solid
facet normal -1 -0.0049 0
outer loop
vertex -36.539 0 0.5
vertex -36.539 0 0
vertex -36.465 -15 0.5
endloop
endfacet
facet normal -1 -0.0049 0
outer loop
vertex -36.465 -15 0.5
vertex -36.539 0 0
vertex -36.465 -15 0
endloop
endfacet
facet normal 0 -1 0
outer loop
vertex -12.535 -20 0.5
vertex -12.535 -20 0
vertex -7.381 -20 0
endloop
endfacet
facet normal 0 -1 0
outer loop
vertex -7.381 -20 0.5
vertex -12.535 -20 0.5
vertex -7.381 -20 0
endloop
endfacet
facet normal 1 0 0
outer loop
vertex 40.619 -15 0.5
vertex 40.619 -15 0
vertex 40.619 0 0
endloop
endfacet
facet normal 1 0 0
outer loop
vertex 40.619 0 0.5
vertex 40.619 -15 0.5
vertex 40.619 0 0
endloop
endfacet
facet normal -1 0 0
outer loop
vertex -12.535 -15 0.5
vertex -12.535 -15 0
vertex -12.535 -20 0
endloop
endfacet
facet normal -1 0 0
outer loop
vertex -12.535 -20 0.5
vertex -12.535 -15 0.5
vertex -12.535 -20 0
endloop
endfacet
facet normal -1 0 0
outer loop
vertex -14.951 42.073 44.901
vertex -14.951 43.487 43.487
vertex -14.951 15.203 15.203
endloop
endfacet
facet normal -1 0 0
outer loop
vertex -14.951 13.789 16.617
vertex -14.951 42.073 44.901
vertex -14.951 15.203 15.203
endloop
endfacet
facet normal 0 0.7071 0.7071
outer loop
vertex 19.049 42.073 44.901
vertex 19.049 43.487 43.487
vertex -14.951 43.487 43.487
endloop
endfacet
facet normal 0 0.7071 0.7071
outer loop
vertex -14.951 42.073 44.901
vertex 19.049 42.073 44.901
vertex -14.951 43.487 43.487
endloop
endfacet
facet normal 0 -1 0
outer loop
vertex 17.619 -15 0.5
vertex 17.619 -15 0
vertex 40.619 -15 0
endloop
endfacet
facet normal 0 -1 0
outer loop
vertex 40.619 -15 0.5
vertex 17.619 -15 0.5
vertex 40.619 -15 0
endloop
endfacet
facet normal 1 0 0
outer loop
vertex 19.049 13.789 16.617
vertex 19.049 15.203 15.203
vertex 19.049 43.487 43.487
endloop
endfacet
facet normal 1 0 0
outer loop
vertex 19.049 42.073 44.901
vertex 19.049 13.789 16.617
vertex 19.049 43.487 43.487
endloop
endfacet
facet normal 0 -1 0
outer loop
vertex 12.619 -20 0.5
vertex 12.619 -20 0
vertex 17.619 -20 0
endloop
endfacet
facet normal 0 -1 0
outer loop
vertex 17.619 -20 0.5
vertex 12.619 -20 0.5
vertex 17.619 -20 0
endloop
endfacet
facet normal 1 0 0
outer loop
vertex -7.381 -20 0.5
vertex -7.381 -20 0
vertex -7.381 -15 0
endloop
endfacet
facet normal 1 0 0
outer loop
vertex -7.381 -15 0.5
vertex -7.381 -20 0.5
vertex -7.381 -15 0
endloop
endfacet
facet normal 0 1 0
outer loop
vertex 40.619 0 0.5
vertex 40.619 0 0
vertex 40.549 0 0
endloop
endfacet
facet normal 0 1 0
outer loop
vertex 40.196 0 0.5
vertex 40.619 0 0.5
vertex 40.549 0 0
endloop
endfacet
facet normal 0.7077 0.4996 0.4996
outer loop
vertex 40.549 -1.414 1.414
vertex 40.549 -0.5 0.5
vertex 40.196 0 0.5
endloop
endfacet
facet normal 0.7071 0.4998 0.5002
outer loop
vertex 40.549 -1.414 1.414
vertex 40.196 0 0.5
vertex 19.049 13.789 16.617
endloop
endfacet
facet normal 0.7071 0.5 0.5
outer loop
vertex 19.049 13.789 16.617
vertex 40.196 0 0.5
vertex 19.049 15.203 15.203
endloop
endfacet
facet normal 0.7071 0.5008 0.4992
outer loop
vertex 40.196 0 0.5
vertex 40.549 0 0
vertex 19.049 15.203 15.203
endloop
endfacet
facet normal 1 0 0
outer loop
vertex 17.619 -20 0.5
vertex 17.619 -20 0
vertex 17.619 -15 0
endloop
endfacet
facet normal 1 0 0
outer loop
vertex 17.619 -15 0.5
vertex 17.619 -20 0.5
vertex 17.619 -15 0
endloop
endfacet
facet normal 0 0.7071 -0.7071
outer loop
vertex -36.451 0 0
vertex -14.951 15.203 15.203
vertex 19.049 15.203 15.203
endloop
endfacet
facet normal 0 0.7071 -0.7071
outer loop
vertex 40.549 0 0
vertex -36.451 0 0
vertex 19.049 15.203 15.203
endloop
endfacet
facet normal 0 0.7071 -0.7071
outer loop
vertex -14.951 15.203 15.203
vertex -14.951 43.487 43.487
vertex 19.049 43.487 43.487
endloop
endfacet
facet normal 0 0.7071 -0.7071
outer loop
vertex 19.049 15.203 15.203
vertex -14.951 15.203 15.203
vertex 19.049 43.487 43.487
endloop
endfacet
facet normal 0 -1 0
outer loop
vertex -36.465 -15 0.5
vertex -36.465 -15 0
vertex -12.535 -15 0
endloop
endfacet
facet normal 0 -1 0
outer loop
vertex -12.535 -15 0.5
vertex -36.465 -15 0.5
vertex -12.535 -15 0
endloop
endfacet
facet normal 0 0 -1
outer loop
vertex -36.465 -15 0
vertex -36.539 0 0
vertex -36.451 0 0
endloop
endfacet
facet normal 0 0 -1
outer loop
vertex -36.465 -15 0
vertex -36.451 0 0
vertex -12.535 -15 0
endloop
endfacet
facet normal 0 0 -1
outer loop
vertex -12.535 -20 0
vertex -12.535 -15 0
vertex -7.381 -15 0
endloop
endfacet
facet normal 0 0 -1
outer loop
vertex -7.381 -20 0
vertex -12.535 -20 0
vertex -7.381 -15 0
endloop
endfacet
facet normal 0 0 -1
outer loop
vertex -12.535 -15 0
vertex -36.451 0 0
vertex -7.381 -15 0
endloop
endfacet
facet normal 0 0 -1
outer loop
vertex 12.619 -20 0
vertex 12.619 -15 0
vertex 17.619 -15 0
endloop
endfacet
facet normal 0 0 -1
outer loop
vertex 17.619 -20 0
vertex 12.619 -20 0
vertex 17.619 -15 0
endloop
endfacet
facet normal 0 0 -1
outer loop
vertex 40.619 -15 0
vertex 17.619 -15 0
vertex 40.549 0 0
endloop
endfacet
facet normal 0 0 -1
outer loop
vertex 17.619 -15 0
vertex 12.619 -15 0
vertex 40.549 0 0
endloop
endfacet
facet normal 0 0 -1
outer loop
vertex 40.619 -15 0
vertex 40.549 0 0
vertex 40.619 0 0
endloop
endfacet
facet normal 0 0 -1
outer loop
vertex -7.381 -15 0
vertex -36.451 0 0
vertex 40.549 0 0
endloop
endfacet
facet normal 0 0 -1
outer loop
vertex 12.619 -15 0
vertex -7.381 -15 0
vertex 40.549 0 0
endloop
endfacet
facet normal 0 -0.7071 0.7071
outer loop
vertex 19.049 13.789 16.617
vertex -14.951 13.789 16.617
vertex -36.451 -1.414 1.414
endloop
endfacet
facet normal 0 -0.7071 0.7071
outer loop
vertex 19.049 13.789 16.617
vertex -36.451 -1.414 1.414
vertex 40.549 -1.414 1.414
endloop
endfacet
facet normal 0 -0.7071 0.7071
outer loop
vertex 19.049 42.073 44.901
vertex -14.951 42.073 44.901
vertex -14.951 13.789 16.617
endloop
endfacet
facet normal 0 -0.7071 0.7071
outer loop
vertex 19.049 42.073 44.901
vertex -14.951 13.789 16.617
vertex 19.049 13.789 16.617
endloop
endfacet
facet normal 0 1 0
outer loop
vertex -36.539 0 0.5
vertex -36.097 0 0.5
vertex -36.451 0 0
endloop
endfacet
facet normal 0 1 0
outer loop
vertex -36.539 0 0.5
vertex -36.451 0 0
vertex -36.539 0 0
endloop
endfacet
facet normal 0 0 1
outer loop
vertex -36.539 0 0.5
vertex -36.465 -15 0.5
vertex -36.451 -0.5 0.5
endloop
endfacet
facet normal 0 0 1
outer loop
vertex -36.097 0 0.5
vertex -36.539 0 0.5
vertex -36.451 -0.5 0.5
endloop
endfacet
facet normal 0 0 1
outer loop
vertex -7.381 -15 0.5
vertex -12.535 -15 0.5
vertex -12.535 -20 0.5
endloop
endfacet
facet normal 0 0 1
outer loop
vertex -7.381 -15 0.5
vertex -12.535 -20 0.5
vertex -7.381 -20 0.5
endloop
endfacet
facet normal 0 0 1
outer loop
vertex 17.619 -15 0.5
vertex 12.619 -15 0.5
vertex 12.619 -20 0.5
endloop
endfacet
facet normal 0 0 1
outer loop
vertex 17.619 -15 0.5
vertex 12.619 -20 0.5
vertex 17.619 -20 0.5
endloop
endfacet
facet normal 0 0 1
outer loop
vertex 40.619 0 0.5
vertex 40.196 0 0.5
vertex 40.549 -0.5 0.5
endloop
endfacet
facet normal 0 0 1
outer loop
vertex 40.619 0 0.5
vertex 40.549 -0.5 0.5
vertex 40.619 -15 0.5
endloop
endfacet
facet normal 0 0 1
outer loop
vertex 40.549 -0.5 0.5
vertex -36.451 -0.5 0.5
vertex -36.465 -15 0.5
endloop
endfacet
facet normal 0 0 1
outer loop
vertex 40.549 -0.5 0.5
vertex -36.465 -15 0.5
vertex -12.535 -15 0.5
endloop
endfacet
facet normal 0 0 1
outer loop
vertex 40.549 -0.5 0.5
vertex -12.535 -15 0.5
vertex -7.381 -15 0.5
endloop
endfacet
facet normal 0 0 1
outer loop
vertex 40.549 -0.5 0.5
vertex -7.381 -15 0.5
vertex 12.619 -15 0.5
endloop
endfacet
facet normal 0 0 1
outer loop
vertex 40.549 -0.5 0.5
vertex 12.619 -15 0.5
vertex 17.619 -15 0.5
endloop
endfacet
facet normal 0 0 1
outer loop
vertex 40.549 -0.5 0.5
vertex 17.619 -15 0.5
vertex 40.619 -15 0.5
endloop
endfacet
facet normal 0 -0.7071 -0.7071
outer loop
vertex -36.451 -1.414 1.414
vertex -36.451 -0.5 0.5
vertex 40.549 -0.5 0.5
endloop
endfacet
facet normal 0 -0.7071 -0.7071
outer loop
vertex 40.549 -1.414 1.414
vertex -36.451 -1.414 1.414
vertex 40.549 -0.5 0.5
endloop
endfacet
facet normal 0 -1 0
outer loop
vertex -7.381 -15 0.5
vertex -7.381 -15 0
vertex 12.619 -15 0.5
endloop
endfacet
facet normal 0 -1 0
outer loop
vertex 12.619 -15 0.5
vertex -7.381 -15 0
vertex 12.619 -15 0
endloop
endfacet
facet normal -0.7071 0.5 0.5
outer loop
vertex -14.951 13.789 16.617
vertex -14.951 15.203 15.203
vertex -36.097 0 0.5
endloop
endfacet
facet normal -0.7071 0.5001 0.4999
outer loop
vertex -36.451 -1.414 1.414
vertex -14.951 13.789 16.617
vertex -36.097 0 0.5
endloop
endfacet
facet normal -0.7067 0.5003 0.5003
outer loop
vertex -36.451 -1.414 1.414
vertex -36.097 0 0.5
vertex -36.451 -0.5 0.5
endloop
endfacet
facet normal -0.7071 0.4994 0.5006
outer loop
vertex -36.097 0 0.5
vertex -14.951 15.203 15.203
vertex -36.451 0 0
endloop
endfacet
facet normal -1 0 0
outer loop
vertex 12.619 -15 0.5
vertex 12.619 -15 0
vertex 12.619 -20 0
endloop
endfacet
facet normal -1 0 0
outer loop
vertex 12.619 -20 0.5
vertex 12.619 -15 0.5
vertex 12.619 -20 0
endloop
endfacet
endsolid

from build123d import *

# Parameters (mm, degrees)
F3_DEPTH = 2
F4_DEPTH = 0.5


with BuildPart() as f3:
    # F2 (on face) → F3 (new body)
    with BuildSketch(Plane(origin=(0, 0, 0), x_dir=(1, 0, 0), z_dir=(0, -0.7071067812, 0.7071067812))):
        Polygon((-14.9508744776, 21.5), (-36.4508744776, 0), (40.5491255224, 0), (19.0491255224, 21.5), (19.0491255224, 61.5), (-14.9508744776, 61.5), align=None)
    extrude(amount=F3_DEPTH)

    # F0 (on Top) → F4 (join)
    with BuildSketch(Plane.XY):
        Polygon((40.6194950176, 0), (-36.539348602, 0), (-36.4647228283, -14.9998143653), (-12.5346706987, -14.9998143653), (-12.5346706987, -20), (-7.3805049824, -20), (-7.3805049824, -14.9998143653), (12.6194950176, -14.9998143653), (12.6194950176, -20), (17.6194950176, -20), (17.6194950176, -15), (40.6194950176, -15), align=None)
    extrude(amount=F4_DEPTH)


solid = f3.part
